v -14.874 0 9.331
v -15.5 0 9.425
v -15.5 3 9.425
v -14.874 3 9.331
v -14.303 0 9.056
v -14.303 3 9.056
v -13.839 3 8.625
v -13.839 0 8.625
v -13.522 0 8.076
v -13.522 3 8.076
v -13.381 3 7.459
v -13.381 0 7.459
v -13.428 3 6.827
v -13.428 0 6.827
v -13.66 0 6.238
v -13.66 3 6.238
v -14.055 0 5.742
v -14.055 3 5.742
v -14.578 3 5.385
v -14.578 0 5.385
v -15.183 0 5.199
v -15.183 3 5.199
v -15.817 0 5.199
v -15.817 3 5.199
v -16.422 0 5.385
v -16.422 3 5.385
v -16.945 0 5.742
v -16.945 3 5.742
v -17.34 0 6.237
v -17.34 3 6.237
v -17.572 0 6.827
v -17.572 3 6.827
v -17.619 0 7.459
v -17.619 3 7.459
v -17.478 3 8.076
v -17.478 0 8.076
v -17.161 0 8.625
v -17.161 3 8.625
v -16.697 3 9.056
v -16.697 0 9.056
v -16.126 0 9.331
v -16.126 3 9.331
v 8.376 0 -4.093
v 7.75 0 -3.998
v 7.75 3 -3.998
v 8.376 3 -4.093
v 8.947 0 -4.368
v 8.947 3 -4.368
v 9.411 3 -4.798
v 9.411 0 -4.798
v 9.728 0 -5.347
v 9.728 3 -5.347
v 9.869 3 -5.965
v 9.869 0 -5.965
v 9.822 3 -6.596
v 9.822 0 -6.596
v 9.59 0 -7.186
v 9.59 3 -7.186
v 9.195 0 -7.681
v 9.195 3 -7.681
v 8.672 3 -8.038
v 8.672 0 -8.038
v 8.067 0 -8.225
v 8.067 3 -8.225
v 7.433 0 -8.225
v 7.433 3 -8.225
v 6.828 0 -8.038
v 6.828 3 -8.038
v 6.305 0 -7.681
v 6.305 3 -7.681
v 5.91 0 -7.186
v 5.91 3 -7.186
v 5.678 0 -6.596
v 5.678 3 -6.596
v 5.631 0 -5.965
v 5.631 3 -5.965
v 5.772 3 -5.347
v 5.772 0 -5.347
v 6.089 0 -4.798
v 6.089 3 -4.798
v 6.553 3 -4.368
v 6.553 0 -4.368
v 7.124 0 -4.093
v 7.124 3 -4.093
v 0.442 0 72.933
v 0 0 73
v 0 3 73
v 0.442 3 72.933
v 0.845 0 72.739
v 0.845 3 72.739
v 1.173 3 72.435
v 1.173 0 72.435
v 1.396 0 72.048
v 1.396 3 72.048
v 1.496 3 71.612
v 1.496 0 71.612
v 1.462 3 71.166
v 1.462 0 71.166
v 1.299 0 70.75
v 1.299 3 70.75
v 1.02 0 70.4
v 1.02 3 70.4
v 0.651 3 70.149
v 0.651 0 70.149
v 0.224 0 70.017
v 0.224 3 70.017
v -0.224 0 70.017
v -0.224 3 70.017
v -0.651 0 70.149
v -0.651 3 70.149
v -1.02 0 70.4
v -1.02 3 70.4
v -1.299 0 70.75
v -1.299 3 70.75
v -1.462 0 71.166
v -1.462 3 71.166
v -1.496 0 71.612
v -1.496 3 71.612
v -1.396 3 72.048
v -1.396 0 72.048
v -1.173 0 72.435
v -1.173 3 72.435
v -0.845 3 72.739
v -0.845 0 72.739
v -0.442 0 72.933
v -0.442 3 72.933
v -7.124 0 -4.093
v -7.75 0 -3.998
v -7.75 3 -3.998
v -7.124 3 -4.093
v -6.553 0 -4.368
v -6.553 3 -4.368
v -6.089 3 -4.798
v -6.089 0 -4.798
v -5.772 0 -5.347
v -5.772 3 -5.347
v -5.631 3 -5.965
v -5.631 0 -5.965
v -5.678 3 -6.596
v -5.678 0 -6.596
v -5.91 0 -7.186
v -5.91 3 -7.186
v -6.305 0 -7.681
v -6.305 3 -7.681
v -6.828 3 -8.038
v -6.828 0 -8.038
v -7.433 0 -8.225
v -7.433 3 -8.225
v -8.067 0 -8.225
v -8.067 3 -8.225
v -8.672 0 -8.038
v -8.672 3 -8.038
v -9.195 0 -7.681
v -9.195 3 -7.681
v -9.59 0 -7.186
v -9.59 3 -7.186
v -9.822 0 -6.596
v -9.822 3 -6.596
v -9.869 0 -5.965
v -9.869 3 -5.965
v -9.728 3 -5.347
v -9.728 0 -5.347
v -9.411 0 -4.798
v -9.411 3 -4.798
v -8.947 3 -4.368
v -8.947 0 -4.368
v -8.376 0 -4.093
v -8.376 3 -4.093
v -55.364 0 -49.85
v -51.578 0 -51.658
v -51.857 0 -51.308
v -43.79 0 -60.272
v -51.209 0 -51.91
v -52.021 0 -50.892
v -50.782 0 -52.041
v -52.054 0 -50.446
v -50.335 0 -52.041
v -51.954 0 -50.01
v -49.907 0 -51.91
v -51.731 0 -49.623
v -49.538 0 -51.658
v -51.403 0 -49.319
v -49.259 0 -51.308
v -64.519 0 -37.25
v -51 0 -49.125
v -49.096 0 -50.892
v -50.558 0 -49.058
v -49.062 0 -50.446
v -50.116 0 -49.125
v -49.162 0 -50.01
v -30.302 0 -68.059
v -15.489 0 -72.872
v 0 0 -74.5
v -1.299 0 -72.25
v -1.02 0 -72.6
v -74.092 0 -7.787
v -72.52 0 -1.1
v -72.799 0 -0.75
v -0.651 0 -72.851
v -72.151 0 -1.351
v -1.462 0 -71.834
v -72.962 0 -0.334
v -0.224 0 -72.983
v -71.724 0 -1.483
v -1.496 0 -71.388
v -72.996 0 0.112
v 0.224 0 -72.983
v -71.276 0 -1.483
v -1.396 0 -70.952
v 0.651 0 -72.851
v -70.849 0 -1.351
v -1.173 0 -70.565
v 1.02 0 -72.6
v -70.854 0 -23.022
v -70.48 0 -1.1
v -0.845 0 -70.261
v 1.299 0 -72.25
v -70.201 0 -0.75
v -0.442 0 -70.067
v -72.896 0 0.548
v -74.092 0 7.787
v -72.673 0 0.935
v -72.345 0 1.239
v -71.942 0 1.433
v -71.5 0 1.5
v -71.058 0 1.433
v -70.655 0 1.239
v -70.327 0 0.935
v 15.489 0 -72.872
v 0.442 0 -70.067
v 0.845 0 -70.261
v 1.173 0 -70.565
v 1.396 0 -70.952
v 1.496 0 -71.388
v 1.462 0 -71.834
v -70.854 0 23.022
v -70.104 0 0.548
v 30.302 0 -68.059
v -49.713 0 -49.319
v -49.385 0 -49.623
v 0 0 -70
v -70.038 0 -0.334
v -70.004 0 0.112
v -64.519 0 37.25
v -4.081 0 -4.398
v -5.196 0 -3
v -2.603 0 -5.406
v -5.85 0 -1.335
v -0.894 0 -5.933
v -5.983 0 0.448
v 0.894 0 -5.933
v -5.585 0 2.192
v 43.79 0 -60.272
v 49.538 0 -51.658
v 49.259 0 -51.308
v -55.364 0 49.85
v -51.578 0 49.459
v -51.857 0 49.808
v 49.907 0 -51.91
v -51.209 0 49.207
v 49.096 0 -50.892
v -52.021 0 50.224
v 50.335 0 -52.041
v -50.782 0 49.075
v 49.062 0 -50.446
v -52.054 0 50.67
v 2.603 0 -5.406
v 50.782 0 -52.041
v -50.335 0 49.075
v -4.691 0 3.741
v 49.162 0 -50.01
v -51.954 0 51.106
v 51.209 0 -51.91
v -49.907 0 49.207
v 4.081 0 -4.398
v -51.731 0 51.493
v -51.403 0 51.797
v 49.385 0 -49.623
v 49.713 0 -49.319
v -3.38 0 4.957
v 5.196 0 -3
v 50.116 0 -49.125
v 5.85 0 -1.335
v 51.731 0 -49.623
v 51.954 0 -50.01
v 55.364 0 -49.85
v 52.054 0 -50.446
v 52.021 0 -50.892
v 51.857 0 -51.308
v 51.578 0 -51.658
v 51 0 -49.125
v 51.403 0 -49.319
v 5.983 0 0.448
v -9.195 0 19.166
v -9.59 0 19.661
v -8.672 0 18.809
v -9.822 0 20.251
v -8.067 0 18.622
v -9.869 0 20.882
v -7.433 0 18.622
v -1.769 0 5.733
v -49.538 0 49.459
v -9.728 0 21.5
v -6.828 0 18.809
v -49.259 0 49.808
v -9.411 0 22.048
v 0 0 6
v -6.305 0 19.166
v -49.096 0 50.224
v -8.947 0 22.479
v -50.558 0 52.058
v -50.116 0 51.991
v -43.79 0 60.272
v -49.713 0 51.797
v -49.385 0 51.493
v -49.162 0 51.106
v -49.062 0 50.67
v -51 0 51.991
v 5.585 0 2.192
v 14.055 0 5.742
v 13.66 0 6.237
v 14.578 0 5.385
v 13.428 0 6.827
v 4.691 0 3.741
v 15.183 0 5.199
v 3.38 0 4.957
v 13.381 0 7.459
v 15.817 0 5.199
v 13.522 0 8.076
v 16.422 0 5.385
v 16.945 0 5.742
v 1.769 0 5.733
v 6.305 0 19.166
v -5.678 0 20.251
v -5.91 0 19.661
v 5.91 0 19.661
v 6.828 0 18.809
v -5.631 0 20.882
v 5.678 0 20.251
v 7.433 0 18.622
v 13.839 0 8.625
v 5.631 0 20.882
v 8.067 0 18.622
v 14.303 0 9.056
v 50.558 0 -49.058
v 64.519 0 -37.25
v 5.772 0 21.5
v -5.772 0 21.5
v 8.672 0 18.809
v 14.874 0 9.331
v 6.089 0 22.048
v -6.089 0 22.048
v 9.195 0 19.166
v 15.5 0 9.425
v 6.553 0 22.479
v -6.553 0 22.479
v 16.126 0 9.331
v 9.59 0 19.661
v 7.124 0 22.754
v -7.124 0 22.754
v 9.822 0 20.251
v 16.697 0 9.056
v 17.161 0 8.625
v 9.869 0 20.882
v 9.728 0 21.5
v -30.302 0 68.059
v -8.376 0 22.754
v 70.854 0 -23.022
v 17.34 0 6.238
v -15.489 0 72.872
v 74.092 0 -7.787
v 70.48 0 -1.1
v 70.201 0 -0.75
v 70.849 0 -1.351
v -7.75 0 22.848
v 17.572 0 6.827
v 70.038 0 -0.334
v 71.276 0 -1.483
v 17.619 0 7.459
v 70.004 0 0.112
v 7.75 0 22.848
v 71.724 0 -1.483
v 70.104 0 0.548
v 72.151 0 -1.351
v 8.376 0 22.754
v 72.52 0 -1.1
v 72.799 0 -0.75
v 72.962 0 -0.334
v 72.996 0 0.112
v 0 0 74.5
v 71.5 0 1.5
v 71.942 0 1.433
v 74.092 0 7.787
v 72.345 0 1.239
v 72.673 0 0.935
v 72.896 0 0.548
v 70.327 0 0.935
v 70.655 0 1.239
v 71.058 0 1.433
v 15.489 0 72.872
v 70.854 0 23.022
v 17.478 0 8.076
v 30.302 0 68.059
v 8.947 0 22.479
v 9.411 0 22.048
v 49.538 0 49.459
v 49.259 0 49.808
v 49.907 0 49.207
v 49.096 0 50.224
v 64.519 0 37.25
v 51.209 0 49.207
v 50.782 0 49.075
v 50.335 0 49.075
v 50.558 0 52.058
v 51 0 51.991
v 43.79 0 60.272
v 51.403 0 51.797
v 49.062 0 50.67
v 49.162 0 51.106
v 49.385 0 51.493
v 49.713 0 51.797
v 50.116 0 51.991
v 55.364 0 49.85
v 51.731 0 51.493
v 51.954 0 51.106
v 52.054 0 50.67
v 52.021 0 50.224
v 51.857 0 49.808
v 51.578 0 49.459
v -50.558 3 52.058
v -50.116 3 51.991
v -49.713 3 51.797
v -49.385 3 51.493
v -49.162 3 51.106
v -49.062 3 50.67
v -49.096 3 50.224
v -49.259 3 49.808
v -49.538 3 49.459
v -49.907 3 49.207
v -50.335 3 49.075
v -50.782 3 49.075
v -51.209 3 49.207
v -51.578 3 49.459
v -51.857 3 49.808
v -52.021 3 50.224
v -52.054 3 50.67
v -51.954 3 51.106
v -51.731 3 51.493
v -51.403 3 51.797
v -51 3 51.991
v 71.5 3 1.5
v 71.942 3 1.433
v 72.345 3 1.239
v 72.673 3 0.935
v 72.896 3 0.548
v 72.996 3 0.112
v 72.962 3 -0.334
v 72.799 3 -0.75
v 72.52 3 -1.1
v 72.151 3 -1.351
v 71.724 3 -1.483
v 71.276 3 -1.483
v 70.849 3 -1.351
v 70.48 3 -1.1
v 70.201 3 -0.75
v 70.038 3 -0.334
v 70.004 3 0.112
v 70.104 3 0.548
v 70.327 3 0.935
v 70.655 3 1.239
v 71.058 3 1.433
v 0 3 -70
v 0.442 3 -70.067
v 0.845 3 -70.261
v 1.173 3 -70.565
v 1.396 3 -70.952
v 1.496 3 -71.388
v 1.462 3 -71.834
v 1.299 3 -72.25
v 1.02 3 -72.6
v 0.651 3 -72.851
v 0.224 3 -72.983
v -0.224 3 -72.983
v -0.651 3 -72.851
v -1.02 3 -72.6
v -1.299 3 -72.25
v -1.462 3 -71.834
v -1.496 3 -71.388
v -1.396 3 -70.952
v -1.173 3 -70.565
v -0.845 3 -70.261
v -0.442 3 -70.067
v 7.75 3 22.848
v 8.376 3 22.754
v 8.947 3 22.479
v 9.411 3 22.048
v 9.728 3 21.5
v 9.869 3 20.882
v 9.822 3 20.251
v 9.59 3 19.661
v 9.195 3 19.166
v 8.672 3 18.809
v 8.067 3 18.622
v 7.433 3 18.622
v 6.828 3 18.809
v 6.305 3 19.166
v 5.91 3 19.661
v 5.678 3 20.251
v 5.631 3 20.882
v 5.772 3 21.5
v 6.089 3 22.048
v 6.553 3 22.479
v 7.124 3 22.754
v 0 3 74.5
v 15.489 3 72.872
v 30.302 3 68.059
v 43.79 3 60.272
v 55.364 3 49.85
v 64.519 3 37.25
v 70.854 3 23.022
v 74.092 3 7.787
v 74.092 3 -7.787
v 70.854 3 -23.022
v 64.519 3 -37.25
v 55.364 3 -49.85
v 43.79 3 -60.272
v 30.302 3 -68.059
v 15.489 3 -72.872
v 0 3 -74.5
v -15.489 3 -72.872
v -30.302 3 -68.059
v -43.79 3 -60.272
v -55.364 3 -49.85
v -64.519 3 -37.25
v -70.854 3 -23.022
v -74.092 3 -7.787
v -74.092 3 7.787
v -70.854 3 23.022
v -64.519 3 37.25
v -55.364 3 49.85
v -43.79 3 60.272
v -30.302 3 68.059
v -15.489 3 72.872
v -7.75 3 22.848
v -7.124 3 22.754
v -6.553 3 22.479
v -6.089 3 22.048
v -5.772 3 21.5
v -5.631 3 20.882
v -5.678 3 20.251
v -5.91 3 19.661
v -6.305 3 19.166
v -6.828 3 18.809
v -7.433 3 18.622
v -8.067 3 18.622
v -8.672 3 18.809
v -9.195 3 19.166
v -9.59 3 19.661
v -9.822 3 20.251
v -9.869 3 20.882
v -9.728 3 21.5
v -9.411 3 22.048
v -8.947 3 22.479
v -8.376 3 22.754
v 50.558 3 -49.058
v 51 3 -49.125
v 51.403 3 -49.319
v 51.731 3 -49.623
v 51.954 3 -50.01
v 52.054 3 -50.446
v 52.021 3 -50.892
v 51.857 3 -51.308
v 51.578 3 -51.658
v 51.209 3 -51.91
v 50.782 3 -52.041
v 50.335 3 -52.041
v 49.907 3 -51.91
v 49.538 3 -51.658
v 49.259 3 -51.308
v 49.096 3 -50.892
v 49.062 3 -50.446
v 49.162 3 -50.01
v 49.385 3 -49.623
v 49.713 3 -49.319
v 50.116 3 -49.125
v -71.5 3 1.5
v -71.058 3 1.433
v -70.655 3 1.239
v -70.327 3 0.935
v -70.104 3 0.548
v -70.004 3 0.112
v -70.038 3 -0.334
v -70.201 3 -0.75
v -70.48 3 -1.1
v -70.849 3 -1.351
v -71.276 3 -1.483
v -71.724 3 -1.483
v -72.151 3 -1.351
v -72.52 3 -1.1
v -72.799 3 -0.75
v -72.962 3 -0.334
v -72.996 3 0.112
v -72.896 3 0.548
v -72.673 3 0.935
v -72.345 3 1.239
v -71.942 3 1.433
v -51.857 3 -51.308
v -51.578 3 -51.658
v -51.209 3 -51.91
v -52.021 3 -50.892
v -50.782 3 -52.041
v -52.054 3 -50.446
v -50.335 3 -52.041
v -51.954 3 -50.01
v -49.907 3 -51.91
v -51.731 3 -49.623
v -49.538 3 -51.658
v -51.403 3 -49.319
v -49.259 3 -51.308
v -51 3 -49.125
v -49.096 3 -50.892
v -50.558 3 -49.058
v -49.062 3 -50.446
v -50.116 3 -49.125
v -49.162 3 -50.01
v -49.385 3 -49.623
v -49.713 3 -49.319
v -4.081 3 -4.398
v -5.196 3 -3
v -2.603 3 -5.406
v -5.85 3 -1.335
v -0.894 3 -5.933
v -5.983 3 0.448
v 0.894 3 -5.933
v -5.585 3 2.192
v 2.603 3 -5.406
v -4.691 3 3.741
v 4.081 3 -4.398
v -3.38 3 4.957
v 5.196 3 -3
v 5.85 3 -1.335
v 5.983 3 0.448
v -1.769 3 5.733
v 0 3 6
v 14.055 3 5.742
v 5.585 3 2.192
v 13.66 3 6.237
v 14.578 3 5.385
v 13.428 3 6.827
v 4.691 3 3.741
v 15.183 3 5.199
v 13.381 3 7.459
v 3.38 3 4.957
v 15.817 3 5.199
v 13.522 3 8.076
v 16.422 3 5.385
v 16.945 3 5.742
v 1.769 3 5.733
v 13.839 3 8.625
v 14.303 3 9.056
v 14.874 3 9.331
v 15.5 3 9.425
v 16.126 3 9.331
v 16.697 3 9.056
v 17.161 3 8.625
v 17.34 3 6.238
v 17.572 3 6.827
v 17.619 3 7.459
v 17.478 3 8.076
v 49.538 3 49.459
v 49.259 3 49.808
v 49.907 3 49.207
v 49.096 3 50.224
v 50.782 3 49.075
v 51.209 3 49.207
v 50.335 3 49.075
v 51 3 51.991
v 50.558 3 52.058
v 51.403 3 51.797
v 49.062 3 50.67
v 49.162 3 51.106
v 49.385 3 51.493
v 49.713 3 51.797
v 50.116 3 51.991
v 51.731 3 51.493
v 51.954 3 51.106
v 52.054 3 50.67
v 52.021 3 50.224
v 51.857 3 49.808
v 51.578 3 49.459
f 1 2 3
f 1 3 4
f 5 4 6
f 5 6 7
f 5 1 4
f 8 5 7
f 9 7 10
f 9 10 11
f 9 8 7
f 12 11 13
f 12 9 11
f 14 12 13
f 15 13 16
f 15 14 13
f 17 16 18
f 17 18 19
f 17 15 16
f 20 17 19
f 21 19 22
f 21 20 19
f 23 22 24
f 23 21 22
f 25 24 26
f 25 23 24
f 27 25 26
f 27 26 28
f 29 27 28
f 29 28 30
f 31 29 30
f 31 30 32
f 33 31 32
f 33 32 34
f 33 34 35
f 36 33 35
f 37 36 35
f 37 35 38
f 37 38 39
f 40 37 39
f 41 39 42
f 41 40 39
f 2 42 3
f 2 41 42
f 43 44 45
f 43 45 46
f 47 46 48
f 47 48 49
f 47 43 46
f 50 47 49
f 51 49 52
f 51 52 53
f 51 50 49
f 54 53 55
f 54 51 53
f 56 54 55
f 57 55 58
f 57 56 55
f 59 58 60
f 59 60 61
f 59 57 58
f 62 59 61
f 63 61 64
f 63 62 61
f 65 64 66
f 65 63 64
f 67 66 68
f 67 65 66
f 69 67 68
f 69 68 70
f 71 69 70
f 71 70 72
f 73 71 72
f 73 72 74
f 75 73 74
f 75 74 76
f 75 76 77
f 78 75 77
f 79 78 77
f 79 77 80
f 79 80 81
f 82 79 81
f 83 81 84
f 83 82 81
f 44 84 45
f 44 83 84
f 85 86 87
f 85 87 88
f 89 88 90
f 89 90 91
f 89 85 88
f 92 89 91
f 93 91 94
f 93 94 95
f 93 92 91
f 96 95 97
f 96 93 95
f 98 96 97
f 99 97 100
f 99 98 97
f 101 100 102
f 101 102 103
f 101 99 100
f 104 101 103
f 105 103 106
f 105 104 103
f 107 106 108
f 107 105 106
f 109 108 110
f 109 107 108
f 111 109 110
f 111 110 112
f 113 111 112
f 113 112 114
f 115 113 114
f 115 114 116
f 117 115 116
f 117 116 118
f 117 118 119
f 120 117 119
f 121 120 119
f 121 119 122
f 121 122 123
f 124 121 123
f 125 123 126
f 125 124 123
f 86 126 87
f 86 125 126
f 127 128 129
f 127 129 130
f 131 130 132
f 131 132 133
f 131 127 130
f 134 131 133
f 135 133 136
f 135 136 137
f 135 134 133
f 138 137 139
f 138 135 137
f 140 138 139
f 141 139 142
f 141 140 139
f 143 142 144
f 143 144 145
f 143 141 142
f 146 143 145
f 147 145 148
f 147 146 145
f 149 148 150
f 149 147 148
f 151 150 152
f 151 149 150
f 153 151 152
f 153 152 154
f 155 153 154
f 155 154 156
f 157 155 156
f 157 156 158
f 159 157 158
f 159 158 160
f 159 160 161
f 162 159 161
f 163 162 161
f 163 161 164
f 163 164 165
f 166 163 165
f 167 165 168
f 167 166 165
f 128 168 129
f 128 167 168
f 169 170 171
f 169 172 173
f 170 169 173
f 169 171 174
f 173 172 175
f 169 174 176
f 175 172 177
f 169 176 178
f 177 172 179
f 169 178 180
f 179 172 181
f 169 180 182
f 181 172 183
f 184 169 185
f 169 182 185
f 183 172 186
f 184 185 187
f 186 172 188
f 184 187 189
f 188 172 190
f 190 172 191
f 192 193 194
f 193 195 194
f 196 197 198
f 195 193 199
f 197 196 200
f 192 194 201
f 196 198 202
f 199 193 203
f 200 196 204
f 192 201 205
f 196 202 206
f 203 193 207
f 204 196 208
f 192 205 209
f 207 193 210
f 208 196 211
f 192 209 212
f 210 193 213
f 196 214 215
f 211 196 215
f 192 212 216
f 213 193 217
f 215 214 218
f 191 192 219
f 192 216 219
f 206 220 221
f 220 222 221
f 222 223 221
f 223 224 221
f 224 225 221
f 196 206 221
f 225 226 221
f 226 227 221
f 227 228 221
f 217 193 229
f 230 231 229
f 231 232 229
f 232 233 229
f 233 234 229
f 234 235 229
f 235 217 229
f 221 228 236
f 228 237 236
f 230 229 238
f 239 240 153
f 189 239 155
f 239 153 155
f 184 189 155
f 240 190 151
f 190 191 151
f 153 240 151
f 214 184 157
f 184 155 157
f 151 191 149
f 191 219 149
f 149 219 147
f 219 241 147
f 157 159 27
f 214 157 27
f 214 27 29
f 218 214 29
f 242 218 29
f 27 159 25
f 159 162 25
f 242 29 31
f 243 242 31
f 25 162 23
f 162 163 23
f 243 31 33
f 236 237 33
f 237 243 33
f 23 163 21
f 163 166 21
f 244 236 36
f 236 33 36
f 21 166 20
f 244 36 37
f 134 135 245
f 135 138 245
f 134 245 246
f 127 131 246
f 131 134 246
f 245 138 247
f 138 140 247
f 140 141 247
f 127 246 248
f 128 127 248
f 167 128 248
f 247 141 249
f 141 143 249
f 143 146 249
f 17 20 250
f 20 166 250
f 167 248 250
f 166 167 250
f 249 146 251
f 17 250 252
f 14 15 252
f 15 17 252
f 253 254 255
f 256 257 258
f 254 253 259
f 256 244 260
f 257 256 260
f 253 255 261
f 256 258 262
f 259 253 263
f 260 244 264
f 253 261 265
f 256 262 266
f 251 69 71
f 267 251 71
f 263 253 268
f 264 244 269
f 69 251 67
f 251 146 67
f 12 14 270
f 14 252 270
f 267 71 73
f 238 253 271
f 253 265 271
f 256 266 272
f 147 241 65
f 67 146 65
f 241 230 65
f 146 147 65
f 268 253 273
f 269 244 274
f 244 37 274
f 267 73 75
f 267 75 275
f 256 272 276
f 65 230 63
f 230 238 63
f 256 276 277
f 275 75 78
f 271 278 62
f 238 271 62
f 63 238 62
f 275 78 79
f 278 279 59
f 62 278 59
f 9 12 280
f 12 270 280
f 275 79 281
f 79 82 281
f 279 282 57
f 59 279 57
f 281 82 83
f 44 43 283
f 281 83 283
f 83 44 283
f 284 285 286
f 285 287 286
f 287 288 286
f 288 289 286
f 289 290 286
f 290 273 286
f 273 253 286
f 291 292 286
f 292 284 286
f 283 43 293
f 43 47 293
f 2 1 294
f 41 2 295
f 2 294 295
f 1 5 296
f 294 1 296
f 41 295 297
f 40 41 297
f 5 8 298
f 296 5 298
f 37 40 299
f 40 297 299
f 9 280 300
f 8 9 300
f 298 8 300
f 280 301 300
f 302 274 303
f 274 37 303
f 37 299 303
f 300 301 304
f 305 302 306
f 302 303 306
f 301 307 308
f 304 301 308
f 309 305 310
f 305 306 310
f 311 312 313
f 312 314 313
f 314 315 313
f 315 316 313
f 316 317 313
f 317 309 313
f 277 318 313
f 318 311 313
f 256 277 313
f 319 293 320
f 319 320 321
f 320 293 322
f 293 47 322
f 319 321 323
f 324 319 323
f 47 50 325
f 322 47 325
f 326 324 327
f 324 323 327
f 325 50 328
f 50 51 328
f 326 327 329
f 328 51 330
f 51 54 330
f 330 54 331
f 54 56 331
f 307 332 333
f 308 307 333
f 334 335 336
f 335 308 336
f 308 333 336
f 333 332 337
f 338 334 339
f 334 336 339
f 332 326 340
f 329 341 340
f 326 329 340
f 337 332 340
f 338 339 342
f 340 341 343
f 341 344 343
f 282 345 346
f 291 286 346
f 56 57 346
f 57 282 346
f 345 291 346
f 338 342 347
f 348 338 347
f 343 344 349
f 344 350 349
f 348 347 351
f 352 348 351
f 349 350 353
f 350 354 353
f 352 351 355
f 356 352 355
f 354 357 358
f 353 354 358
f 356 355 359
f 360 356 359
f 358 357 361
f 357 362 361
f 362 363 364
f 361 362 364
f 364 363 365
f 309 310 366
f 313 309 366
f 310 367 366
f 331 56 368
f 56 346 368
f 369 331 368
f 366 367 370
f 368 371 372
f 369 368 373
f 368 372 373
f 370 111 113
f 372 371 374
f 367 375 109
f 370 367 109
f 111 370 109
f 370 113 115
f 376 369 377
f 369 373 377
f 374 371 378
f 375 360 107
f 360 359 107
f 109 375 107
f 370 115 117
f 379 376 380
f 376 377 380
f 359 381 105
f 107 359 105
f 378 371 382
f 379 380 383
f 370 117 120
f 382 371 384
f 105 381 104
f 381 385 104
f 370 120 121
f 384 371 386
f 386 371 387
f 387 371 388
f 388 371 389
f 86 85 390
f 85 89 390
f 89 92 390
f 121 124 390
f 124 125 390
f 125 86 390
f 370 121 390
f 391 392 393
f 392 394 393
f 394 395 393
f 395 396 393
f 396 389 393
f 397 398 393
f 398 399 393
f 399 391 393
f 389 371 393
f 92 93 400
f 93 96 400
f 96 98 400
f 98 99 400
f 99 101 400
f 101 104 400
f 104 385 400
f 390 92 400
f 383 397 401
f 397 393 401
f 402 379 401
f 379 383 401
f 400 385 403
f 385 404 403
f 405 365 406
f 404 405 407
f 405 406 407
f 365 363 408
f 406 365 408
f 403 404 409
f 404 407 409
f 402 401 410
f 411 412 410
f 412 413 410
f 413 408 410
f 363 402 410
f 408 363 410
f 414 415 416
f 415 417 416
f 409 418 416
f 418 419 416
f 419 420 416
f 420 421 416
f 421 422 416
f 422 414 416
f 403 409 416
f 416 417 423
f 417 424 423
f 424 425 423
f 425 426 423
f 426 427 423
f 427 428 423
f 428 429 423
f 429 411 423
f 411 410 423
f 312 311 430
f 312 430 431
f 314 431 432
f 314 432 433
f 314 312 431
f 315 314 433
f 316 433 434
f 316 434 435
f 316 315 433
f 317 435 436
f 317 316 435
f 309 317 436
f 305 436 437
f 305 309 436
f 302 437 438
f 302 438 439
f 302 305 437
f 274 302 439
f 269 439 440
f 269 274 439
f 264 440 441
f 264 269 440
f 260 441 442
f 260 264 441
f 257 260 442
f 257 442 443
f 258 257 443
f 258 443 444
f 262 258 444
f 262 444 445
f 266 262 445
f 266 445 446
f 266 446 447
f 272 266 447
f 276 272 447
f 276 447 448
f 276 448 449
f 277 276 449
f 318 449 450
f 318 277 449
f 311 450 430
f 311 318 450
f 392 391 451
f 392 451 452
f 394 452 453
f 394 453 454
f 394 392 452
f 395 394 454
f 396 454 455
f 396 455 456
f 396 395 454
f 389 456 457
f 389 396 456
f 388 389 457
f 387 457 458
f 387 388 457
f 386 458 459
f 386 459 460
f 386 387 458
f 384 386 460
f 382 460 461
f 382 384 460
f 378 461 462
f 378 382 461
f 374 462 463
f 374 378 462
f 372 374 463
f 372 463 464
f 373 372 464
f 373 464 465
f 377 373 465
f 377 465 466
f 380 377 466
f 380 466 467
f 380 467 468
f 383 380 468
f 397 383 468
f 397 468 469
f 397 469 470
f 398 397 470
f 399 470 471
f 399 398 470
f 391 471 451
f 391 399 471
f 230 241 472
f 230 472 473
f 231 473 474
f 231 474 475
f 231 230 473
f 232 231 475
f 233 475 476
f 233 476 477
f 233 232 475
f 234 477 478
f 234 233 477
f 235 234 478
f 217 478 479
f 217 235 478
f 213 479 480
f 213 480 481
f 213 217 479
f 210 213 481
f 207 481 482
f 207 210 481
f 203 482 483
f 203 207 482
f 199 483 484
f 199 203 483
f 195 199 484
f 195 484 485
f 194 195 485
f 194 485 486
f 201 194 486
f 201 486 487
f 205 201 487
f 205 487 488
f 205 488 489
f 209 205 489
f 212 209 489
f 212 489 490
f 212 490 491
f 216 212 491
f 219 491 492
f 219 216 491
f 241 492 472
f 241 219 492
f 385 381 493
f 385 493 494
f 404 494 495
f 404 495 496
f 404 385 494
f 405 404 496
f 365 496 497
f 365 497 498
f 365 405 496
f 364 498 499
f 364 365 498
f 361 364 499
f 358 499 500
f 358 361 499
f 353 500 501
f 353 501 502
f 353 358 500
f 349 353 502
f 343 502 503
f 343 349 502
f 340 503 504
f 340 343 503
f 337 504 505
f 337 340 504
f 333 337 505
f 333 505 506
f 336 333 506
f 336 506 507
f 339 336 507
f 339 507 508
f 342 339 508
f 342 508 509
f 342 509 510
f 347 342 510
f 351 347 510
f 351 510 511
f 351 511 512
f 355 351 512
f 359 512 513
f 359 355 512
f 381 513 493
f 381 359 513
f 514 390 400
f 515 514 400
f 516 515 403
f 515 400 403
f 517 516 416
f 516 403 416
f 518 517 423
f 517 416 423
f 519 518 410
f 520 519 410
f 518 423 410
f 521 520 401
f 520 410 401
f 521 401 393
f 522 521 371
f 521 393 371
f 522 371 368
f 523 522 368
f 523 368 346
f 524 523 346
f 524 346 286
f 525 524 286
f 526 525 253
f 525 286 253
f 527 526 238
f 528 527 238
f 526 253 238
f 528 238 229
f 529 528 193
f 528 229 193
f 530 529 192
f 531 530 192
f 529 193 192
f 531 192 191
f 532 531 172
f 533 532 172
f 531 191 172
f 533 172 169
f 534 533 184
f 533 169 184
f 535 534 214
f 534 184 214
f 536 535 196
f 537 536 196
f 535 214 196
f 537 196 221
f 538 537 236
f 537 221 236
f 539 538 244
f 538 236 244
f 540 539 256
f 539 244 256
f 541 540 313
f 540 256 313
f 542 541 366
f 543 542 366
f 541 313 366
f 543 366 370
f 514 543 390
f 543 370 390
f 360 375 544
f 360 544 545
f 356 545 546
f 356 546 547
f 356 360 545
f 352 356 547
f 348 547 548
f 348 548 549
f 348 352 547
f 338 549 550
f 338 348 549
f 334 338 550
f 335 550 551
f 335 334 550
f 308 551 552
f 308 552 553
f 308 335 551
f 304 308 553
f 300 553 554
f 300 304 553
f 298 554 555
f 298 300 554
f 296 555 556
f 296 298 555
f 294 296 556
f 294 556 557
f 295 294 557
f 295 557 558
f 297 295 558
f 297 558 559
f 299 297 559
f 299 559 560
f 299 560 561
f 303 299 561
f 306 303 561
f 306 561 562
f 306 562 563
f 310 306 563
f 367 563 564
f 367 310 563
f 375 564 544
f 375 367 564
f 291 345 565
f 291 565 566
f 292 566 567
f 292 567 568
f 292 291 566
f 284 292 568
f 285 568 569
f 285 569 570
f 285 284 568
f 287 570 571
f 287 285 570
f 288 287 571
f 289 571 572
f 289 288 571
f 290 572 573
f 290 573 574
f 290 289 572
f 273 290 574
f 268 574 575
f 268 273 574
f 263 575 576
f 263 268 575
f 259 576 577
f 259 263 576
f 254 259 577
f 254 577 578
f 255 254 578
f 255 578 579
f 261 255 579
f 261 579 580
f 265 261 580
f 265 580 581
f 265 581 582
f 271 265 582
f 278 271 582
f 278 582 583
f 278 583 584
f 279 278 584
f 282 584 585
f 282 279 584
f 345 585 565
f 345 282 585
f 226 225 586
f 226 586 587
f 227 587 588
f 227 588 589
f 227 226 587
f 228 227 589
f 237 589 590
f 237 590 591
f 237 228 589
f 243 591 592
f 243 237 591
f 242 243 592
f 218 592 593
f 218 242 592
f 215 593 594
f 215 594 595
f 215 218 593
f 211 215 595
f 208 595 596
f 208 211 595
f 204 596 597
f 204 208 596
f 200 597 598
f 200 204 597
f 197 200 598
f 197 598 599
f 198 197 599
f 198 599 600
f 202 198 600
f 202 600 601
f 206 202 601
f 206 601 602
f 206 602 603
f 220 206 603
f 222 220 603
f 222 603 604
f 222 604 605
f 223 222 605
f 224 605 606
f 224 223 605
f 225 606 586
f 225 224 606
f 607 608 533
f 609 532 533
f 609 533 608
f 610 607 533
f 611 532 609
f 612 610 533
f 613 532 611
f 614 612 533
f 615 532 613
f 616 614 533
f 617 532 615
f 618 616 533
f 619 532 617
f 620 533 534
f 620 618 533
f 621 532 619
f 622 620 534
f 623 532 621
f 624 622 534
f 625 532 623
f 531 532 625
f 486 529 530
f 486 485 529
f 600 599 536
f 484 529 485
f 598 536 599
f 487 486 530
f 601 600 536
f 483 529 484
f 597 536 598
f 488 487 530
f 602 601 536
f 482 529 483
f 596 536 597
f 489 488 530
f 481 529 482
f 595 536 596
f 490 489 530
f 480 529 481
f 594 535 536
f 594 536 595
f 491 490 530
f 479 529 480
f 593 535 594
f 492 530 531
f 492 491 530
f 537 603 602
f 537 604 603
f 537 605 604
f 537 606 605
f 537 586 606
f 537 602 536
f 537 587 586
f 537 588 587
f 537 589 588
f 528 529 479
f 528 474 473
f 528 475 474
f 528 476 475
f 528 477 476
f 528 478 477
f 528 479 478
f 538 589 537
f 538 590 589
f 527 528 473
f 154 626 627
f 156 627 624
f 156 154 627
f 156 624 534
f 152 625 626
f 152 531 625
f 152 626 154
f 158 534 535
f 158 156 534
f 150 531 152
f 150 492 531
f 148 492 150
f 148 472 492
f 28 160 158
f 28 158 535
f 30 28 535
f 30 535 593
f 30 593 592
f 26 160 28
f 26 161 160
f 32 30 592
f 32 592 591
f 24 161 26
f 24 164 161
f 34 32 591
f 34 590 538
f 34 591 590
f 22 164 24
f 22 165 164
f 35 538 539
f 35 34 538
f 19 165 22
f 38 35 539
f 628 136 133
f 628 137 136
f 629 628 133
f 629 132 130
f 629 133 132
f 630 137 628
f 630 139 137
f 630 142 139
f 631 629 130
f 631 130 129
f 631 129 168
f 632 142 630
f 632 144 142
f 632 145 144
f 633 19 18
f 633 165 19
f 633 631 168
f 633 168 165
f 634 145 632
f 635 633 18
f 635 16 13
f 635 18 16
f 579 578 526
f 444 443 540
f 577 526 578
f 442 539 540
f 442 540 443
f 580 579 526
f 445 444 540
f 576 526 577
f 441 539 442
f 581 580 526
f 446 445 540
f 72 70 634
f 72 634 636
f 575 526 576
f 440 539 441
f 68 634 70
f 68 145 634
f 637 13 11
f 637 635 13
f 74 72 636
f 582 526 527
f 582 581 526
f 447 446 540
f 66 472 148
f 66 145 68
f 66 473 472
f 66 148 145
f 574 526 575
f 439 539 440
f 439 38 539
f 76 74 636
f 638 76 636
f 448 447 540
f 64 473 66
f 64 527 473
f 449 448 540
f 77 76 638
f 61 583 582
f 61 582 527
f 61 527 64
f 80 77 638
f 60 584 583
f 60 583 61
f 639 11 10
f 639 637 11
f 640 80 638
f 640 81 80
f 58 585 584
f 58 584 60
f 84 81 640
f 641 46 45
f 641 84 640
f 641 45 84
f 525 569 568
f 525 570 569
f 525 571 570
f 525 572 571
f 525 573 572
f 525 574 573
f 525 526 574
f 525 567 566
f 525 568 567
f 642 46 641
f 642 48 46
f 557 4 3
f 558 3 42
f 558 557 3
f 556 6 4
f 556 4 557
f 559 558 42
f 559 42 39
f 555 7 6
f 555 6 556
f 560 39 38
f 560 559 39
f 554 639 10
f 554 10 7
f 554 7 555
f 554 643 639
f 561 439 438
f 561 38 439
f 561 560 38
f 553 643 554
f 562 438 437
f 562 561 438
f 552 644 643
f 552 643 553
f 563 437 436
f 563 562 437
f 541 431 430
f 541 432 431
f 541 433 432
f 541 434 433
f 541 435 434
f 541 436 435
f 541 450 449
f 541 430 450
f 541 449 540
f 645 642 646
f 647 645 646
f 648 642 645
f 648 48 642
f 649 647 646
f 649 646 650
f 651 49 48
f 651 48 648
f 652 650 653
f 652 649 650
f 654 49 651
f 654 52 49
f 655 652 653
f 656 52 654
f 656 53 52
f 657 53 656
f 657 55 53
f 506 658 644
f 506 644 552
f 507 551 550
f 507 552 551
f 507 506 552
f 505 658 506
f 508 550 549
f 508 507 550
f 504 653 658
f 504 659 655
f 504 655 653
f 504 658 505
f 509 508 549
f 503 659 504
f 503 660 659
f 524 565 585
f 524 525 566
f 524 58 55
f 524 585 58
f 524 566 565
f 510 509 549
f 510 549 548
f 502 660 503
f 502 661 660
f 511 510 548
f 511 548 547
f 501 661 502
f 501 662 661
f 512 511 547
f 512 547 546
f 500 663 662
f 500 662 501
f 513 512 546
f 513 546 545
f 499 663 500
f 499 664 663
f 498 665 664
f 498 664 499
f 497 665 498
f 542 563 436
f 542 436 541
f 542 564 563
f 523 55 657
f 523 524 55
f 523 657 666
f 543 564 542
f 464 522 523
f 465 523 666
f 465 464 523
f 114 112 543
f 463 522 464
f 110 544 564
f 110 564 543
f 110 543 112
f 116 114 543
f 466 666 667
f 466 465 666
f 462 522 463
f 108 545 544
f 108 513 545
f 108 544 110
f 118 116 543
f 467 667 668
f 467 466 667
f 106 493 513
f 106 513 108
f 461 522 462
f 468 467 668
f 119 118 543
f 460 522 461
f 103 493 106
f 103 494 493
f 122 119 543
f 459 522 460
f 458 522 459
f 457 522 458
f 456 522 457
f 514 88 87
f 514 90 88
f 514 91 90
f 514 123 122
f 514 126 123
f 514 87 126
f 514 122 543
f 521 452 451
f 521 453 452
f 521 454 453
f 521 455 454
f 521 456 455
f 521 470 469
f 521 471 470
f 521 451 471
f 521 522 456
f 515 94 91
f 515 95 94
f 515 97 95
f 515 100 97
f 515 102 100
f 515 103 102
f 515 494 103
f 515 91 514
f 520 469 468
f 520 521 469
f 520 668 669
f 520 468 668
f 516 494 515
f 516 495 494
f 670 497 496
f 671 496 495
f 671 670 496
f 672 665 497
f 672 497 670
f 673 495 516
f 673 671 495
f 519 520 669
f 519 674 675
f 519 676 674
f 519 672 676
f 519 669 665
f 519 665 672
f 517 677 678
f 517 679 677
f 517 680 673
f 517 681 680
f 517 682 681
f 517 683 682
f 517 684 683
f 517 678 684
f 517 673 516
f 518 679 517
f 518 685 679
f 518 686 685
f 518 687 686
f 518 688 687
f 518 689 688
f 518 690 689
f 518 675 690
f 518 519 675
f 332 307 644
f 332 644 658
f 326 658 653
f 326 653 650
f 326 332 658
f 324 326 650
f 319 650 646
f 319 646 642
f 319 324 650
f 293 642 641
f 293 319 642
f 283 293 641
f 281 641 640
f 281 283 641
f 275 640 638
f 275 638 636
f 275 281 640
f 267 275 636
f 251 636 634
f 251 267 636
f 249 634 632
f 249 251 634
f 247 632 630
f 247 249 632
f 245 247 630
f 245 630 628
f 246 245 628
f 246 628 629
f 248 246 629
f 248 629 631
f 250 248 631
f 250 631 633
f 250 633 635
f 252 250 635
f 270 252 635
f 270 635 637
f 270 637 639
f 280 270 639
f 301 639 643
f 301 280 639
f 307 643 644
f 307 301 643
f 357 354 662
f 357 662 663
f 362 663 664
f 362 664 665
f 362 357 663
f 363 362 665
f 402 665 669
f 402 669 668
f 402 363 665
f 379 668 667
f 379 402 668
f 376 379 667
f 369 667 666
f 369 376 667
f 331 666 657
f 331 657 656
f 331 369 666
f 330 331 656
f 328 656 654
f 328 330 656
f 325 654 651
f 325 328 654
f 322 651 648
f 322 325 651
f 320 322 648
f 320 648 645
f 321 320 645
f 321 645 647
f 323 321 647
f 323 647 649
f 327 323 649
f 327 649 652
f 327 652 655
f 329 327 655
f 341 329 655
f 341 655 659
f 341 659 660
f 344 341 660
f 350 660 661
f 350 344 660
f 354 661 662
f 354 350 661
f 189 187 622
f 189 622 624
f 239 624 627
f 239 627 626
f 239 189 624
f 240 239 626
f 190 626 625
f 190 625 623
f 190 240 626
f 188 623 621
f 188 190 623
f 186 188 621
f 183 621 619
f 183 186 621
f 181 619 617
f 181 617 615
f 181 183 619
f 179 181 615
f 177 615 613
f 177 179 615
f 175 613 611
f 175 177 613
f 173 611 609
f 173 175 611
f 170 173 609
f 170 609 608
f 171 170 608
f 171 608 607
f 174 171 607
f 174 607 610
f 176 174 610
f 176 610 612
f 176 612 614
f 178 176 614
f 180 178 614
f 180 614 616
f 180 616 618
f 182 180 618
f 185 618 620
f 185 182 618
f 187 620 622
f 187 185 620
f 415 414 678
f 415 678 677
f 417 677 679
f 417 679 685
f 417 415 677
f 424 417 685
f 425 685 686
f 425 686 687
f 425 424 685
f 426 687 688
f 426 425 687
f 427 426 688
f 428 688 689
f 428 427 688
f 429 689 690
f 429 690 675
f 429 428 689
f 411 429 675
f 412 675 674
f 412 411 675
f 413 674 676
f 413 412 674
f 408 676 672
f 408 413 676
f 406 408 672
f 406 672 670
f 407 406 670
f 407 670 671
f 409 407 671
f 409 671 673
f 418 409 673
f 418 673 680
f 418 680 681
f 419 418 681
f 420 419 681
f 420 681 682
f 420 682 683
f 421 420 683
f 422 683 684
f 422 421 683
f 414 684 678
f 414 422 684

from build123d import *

# Parameters (mm, degrees)
SKETCH_2_R      = 74.5
SKETCH_2_R_2    = 1.5
SKETCH_2_R_3    = 2.125
SKETCH_2_R_4    = 6
EXTRUDE_1_DEPTH = 3


with BuildPart() as part:
    # 草图2 → 凸台-拉伸1 (new body)
    with BuildSketch(Plane(origin=(0, 0, 0), x_dir=(1, 0, 0), z_dir=(0, 1, 0))):
        with Locations(Location((0, 0, 0), (0, 0, 270))):
            Circle(SKETCH_2_R)
        with Locations(Location((-50.558134855, -50.558134855, 0), (0, 0, 270))):
            Circle(SKETCH_2_R_2, mode=Mode.SUBTRACT)
        with Locations(Location((-71.5, 0, 0), (0, 0, 270))):
            Circle(SKETCH_2_R_2, mode=Mode.SUBTRACT)
        with Locations(Location((0, -71.5, 0), (0, 0, 270))):
            Circle(SKETCH_2_R_2, mode=Mode.SUBTRACT)
        with Locations(Location((50.558134855, -50.558134855, 0), (0, 0, 270))):
            Circle(SKETCH_2_R_2, mode=Mode.SUBTRACT)
        with Locations(Location((-50.558134855, 50.558134855, 0), (0, 0, 270))):
            Circle(SKETCH_2_R_2, mode=Mode.SUBTRACT)
        with Locations(Location((71.5, 0, 0), (0, 0, 270))):
            Circle(SKETCH_2_R_2, mode=Mode.SUBTRACT)
        with Locations(Location((0, 71.5, 0), (0, 0, 270))):
            Circle(SKETCH_2_R_2, mode=Mode.SUBTRACT)
        with Locations(Location((50.558134855, 50.558134855, 0), (0, 0, 270))):
            Circle(SKETCH_2_R_2, mode=Mode.SUBTRACT)
        with Locations(Location((7.75, 6.123393759, 0), (0, 0, 270))):
            Circle(SKETCH_2_R_3, mode=Mode.SUBTRACT)
        with Locations(Location((-7.75, -20.723393759, 0), (0, 0, 270))):
            Circle(SKETCH_2_R_3, mode=Mode.SUBTRACT)
        with Locations(Location((-15.5, -7.3, 0), (0, 0, 270))):
            Circle(SKETCH_2_R_3, mode=Mode.SUBTRACT)
        with Locations(Location((7.75, -20.723393759, 0), (0, 0, 270))):
            Circle(SKETCH_2_R_3, mode=Mode.SUBTRACT)
        with Locations(Location((15.5, -7.3, 0), (0, 0, 270))):
            Circle(SKETCH_2_R_3, mode=Mode.SUBTRACT)
        with Locations(Location((-7.75, 6.123393759, 0), (0, 0, 270))):
            Circle(SKETCH_2_R_3, mode=Mode.SUBTRACT)
        with Locations(Location((0, 0, 0), (0, 0, 270))):
            Circle(SKETCH_2_R_4, mode=Mode.SUBTRACT)
    extrude(amount=EXTRUDE_1_DEPTH)


solid = part.part
